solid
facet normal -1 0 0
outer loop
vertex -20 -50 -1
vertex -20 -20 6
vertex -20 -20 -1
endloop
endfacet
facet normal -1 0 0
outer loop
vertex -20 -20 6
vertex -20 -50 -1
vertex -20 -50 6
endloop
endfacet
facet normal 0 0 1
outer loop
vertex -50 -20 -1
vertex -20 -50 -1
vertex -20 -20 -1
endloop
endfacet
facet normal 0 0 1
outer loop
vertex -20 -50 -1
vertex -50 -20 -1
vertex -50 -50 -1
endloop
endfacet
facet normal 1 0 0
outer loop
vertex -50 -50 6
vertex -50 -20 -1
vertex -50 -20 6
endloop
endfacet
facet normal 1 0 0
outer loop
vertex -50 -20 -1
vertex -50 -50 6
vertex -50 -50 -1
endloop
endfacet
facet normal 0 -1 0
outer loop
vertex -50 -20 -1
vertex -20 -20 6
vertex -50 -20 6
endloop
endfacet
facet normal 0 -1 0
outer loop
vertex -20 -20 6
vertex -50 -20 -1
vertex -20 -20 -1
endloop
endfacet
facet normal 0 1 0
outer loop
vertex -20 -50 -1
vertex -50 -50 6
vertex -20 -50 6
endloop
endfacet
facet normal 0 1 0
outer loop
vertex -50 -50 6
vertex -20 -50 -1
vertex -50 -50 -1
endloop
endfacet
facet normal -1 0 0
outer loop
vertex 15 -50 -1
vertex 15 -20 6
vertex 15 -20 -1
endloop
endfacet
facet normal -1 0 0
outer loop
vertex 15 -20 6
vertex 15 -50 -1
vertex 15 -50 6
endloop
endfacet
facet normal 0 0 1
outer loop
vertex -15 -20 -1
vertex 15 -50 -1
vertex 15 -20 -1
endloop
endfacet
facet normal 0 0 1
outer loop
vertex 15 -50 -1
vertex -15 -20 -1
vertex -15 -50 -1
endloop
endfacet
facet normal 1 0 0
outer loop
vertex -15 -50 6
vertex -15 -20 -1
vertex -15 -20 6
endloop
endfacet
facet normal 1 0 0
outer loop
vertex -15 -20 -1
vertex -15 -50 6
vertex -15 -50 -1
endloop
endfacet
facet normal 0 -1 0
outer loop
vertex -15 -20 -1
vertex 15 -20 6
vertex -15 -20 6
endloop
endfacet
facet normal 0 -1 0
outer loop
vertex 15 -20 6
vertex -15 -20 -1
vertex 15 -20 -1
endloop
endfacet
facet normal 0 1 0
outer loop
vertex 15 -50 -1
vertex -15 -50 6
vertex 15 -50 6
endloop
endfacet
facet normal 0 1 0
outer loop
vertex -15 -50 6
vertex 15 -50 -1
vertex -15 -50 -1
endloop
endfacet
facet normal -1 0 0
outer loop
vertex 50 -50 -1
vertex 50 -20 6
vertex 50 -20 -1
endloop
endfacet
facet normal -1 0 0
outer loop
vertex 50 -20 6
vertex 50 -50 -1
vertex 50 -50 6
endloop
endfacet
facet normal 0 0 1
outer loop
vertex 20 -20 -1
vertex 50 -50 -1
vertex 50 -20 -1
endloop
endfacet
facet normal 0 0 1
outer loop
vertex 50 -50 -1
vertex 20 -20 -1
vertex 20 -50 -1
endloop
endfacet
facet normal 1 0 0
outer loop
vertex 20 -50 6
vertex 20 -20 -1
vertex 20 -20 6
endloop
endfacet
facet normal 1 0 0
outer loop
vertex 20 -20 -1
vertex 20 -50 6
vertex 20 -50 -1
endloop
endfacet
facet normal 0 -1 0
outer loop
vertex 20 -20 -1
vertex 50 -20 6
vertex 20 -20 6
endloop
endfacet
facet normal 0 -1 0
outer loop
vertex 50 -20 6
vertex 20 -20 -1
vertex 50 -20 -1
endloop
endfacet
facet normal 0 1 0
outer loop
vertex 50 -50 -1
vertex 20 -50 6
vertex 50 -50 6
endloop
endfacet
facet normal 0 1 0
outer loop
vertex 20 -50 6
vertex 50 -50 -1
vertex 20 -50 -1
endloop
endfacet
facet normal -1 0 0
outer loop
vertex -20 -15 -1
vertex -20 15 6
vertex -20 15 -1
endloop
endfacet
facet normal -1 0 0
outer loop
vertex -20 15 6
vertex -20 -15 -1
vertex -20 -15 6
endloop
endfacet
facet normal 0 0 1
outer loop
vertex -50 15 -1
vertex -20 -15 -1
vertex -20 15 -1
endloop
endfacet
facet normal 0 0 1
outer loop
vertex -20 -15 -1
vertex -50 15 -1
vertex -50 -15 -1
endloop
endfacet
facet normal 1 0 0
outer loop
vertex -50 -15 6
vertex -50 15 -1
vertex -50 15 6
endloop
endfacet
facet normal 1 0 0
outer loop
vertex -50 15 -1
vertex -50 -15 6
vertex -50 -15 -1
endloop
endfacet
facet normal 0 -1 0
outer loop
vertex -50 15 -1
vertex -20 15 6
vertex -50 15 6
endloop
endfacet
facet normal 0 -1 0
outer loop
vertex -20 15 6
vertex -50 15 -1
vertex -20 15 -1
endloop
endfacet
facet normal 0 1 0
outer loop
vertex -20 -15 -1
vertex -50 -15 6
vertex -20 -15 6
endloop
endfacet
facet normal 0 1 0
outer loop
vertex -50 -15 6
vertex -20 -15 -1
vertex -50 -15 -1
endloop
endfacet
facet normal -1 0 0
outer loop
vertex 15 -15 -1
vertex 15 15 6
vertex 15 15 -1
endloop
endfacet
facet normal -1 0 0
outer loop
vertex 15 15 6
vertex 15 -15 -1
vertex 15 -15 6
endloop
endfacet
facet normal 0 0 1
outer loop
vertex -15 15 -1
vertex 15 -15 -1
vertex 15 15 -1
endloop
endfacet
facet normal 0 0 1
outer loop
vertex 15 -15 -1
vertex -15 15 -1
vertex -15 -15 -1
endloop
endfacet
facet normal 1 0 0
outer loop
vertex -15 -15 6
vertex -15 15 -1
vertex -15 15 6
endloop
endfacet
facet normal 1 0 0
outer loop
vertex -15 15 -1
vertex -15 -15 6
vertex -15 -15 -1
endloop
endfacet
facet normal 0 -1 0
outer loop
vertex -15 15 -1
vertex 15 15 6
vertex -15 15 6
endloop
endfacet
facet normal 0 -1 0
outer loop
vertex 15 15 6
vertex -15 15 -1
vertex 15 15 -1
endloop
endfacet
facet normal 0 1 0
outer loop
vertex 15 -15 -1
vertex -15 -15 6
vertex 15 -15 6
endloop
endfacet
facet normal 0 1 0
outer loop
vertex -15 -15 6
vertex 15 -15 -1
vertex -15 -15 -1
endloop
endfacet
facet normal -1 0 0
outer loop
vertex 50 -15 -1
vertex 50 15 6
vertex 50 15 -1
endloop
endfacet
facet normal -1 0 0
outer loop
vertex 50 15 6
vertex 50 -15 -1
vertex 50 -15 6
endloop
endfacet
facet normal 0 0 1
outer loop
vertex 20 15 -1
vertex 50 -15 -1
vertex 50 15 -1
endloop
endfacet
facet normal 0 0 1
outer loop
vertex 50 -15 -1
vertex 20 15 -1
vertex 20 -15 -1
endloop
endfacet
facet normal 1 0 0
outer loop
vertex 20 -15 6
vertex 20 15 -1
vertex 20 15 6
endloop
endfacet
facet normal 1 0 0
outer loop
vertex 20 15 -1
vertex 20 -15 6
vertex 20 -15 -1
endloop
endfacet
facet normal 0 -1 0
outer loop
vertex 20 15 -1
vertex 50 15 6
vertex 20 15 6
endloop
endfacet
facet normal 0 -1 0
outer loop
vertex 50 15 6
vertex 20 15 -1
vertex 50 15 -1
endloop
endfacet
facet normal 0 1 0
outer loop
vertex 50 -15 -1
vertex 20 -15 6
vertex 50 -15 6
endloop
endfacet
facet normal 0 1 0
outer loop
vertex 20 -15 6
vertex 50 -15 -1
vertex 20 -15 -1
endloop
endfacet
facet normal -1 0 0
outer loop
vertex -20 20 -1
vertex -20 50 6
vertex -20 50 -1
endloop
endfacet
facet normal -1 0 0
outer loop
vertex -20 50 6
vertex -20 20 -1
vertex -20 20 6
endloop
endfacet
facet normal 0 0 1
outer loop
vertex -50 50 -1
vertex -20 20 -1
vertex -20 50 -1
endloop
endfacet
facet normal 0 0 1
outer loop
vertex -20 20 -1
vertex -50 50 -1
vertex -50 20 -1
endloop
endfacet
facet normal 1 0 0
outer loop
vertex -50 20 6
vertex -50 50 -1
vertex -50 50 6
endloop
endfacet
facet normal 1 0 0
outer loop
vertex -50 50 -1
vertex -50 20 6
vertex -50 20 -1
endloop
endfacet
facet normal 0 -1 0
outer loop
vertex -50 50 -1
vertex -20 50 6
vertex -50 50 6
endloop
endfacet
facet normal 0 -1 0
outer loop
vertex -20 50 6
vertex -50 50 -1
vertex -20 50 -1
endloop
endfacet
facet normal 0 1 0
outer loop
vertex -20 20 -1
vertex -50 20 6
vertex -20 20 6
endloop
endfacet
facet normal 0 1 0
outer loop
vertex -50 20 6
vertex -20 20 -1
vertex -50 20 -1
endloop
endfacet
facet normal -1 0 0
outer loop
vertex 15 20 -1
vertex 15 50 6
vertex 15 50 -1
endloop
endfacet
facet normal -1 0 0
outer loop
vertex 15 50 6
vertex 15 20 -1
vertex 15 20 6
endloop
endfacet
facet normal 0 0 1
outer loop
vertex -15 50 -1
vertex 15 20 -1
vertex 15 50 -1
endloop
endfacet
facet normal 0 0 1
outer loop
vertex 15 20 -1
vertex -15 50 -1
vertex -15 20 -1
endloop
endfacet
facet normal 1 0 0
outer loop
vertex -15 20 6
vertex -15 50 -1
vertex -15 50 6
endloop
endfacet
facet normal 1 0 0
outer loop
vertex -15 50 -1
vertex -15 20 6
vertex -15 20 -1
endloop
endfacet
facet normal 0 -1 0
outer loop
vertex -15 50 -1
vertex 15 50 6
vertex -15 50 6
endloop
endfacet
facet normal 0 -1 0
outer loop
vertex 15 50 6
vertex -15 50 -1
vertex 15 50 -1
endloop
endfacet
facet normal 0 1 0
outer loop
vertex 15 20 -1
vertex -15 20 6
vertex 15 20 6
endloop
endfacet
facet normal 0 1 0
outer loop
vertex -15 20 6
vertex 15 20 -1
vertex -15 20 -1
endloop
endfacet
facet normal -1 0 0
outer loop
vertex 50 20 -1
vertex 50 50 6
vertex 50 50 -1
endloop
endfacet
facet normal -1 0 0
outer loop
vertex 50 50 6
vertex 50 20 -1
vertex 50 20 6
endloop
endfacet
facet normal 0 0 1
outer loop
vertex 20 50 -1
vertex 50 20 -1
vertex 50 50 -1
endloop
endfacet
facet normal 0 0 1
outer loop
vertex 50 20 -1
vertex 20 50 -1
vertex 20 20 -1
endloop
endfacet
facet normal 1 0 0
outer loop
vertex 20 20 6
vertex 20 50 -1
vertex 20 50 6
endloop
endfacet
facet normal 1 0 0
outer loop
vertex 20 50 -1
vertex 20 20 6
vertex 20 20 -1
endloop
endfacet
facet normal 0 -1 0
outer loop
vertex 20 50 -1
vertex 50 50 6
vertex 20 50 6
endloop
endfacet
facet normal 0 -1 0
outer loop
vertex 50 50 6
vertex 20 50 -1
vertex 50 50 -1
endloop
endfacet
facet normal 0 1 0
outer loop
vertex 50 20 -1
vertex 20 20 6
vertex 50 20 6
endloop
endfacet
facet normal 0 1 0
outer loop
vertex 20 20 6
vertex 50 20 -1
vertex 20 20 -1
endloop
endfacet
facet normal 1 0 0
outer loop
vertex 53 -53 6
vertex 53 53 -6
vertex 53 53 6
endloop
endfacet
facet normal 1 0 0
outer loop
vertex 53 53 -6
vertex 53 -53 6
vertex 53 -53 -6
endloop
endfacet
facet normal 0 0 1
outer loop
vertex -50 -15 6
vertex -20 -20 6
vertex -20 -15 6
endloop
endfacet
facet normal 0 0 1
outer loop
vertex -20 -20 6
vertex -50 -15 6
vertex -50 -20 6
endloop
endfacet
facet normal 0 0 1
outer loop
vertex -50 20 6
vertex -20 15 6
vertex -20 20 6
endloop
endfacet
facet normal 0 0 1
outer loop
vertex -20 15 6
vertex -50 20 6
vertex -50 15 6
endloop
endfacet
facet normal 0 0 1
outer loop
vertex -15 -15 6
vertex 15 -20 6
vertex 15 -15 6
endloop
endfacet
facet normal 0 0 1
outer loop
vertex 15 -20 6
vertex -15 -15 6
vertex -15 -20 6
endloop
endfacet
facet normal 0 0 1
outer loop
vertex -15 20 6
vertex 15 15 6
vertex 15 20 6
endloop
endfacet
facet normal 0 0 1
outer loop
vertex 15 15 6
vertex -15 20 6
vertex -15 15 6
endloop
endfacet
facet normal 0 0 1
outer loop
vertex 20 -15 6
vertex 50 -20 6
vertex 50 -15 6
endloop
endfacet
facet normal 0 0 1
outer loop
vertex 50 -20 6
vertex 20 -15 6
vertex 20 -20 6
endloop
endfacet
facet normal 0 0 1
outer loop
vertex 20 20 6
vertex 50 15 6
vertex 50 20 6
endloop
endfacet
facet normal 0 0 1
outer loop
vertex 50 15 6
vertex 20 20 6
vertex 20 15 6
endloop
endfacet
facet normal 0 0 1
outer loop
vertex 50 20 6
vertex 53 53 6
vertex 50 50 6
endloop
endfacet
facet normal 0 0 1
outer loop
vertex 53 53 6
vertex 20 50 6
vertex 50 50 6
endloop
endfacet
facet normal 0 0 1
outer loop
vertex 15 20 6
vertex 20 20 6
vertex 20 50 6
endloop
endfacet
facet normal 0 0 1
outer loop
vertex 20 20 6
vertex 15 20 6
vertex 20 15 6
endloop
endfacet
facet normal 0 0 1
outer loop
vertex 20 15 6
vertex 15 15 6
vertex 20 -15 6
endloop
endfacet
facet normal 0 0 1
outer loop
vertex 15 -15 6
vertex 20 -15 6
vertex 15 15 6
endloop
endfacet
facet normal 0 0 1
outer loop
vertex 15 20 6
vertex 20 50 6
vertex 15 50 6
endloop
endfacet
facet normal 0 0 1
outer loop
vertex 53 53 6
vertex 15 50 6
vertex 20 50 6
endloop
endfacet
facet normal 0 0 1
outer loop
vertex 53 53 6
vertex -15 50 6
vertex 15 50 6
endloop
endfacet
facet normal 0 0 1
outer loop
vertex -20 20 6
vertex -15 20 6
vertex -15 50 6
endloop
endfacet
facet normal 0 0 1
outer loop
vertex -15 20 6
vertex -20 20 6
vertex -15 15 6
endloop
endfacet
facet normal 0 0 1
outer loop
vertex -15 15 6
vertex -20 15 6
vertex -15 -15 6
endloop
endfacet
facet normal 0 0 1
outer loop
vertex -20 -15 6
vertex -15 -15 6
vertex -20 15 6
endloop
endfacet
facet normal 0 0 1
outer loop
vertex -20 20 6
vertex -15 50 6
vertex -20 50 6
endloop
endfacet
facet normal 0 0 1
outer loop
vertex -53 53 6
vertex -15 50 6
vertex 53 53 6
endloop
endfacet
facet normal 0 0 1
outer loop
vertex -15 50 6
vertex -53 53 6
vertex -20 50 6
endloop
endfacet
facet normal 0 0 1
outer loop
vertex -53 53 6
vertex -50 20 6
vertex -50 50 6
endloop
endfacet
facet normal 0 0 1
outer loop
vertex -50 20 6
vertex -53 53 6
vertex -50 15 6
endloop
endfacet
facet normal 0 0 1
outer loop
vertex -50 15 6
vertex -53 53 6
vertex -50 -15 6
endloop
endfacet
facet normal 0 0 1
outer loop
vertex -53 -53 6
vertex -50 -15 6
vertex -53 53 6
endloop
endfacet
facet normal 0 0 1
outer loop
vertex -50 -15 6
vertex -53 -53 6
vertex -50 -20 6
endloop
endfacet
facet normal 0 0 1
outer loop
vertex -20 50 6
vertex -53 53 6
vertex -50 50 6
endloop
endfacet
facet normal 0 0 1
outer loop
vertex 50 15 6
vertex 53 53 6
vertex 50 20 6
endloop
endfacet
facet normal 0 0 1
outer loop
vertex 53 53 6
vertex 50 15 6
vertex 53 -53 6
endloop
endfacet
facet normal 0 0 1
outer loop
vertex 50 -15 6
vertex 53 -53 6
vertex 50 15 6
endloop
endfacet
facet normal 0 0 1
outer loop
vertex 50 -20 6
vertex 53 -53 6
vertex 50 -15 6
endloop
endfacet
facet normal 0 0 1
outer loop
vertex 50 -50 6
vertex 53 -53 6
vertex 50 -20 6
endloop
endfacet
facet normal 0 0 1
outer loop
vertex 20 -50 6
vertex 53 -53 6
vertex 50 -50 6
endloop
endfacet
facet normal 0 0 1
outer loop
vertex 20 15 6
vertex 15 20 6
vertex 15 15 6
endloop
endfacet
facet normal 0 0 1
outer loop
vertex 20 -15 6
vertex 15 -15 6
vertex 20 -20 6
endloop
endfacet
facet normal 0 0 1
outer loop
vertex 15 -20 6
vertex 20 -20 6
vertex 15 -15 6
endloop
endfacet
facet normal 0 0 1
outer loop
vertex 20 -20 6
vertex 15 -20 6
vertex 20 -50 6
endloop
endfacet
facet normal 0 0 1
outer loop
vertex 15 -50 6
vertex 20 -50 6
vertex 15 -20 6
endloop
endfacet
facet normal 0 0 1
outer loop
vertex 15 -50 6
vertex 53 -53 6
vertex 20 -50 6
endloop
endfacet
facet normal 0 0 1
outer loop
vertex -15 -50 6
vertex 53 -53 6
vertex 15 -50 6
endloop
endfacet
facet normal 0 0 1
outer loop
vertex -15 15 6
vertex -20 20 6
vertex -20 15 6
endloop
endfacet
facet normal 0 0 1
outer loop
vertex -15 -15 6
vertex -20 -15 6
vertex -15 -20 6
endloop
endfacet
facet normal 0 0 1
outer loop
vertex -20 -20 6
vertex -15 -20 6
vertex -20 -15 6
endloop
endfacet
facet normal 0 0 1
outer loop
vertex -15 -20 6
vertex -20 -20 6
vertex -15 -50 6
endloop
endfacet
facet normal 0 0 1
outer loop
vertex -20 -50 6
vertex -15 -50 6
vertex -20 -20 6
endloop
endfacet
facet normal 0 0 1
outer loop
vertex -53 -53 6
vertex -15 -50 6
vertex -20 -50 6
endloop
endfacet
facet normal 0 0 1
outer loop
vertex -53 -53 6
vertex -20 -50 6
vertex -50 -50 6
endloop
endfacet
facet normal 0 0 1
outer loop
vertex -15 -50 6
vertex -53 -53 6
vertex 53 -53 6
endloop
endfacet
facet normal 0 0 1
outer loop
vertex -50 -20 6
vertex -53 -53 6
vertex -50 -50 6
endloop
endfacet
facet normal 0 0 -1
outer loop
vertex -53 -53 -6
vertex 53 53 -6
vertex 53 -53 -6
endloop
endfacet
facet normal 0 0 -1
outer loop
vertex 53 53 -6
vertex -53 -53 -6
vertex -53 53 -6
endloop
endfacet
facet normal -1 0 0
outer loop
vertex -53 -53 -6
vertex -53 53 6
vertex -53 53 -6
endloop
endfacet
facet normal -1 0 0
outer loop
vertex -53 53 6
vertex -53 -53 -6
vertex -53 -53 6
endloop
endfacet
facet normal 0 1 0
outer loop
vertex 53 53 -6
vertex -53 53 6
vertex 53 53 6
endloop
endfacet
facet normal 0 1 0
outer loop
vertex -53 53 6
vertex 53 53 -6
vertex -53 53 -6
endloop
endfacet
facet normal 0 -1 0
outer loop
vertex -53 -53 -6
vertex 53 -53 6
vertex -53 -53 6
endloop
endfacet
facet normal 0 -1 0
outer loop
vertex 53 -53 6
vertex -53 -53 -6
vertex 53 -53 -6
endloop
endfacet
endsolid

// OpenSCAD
$fn = 32;

// ----------------------------------------------------------------------
// Pocket plate 106 x 106 x 12
// 3 x 3 pockets 30 mm square, 7 mm deep
// ----------------------------------------------------------------------

// --- parameters (mm) ---
thickness = 12;  // plate thickness
floor_t = 5;     // material left under each pocket
pocket = 30;     // pocket side length
pitch_x = 35;    // pocket pitch along X
pitch_y = 35;    // pocket pitch along Y
cols = 3;        // pockets per row
rows = 3;        // rows of pockets

// --- derived feature positions (mm) ---
depth = thickness - floor_t;        // = 7   pocket depth, down to the floor
span_x = (cols - 1) * pitch_x;      // = 70   distance between outer pockets
span_y = (rows - 1) * pitch_y;      // = 70   distance between outer pocket rows
origin_x = -span_x / 2;             // = -35   X of the first pocket
origin_y = -span_y / 2;             // = -35   Y of the first pocket
plate = [span_x + pocket + 6, span_y + pocket + 6, thickness];  // = [106, 106, 12]   overall size: pockets plus 3 mm of wall on each side
feature_centers = [
  [origin_x + 0 * pitch_x, origin_y + 0 * pitch_y],
  [origin_x + 1 * pitch_x, origin_y + 0 * pitch_y],
  [origin_x + 2 * pitch_x, origin_y + 0 * pitch_y],
  [origin_x + 0 * pitch_x, origin_y + 1 * pitch_y],
  [origin_x + 1 * pitch_x, origin_y + 1 * pitch_y],
  [origin_x + 2 * pitch_x, origin_y + 1 * pitch_y],
  [origin_x + 0 * pitch_x, origin_y + 2 * pitch_y],
  [origin_x + 1 * pitch_x, origin_y + 2 * pitch_y],
  [origin_x + 2 * pitch_x, origin_y + 2 * pitch_y]
];   // pocket centres, used verbatim by the cutter loop

// plate outline, then one pocket per centre in feature_centers
difference() {
  cube(plate, center = true);
  for (centre = feature_centers)
    translate([centre[0] - pocket / 2, centre[1] - pocket / 2, plate[2] / 2 - depth])
      cube([pocket, pocket, depth + 1]);  // centred on the declared pocket centre
}
